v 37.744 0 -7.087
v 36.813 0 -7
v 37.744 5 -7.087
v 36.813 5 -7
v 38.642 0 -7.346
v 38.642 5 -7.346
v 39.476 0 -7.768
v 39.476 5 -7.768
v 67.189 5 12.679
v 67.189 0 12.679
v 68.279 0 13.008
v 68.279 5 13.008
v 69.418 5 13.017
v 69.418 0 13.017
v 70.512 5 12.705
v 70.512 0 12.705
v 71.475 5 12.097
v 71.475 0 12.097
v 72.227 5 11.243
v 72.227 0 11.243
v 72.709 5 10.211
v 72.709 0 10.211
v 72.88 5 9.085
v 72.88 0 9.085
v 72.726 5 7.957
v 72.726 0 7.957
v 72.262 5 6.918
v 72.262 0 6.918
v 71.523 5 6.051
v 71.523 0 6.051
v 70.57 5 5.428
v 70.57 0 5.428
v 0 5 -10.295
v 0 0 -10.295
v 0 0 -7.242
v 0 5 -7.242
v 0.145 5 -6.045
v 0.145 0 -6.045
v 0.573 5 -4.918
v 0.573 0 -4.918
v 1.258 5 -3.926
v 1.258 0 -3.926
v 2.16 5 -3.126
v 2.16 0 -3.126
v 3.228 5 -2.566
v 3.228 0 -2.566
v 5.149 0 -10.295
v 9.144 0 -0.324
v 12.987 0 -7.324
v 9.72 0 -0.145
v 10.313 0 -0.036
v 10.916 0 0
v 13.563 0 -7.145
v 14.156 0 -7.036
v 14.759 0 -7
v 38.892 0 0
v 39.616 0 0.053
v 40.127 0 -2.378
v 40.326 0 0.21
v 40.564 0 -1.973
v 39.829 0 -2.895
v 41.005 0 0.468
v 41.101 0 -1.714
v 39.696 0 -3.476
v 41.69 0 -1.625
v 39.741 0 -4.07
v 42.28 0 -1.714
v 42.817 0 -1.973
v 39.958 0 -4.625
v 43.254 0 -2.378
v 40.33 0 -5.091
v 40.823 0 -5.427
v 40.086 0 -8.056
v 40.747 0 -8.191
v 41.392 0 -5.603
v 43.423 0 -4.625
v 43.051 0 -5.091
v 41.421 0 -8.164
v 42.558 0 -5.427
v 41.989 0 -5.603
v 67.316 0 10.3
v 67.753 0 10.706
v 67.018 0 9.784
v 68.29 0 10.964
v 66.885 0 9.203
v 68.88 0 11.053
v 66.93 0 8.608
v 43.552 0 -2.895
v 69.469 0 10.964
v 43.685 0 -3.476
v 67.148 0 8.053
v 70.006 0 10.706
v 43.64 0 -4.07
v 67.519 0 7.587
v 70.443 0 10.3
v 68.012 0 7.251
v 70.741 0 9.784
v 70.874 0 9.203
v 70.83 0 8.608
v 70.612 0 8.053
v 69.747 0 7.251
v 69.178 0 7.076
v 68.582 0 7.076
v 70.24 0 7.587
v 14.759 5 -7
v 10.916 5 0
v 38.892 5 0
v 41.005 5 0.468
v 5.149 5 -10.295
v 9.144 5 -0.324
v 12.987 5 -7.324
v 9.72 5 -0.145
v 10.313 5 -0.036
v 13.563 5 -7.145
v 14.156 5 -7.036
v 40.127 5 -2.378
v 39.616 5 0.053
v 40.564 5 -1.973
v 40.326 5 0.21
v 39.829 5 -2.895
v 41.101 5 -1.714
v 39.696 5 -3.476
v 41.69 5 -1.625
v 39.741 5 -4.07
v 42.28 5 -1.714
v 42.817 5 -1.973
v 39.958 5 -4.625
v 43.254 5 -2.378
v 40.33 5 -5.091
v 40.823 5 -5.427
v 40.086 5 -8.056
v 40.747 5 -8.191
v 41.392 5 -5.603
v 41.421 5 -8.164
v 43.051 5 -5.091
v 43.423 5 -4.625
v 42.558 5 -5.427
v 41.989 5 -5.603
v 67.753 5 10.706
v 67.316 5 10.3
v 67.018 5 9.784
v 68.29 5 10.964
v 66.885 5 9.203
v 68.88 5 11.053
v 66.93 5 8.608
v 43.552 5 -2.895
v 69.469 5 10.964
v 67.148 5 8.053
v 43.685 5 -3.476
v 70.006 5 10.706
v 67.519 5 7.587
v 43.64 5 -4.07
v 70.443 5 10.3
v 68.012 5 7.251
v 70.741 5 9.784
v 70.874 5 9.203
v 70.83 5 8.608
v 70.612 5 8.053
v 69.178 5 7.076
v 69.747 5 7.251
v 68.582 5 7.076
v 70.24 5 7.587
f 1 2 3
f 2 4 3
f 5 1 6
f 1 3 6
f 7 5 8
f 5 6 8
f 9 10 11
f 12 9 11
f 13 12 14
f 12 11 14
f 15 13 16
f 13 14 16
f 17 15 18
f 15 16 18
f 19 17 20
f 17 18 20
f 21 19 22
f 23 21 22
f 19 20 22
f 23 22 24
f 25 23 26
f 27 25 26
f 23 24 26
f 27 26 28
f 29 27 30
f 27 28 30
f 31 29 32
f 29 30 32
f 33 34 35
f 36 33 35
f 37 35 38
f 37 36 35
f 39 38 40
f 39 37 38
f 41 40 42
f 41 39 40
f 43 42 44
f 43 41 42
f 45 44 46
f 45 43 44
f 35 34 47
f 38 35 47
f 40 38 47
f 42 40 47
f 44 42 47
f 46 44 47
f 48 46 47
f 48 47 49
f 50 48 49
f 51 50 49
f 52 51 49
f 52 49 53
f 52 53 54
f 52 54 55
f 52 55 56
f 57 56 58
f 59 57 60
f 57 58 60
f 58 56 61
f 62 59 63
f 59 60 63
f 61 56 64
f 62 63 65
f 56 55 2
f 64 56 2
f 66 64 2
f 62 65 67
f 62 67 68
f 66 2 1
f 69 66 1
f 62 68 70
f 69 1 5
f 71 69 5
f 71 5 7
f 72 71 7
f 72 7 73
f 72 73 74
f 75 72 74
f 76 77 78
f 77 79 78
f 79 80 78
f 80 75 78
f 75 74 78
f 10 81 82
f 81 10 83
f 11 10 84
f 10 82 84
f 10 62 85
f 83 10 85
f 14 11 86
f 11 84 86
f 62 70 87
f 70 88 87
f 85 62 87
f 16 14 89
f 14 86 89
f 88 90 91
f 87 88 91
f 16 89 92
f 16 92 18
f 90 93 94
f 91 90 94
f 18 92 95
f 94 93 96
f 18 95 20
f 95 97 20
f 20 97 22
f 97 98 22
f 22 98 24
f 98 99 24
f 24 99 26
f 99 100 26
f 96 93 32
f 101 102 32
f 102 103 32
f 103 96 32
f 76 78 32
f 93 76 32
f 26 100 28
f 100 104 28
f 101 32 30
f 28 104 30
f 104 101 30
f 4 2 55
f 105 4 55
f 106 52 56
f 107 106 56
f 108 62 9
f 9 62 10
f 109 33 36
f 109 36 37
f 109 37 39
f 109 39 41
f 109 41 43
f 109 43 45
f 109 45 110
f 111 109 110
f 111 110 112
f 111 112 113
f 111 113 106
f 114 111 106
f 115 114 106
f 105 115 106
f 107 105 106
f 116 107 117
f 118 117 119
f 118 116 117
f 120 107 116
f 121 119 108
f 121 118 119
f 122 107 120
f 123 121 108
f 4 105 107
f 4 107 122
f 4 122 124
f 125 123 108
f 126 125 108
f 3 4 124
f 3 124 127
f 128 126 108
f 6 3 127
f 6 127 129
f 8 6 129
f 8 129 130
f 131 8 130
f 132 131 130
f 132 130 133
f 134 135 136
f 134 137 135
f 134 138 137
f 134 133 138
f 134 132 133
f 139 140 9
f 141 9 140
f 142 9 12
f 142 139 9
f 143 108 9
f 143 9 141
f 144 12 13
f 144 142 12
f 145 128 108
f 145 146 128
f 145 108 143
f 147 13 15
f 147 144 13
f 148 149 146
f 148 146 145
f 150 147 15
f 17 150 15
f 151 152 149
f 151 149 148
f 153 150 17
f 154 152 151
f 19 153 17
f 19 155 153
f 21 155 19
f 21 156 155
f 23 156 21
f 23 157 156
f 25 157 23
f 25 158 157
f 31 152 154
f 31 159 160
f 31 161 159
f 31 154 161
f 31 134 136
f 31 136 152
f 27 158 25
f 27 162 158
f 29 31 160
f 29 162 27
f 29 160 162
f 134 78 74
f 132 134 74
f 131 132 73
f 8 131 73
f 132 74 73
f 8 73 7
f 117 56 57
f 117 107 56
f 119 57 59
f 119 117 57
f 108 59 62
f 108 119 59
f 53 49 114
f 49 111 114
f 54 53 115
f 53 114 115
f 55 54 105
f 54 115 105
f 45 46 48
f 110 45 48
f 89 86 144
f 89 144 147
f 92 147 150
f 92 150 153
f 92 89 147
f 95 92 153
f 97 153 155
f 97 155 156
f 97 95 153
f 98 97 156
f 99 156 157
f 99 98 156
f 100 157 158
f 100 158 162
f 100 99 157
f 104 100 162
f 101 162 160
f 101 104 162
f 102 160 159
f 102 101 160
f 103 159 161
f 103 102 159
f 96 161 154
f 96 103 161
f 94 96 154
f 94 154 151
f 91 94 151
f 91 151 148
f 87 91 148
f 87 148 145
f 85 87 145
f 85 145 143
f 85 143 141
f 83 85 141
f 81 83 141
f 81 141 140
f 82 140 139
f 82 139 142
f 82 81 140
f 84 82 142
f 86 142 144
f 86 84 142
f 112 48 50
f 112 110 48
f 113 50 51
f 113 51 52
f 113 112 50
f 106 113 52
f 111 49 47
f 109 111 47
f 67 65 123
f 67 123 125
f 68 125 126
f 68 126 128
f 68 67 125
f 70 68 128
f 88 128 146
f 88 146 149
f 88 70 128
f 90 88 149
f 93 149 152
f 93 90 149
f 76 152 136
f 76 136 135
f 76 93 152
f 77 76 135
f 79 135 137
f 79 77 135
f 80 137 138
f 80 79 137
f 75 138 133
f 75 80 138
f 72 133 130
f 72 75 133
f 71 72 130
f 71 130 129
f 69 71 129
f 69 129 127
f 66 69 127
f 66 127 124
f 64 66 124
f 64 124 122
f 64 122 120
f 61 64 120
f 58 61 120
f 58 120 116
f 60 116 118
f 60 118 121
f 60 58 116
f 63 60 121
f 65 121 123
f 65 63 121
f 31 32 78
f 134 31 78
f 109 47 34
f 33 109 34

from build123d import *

# Parameters (mm, degrees)
ESQUISSE1_R        = 2
BOSS_EXTRU_1_DEPTH = 5
CONG_1_R           = 5


with BuildPart() as part:
    # Esquisse1 → Boss.-Extru.1 (new body)
    with BuildSketch(Plane(origin=(0, 0, 0), x_dir=(1, 0, 0), z_dir=(0, 1, 0))):
        with BuildLine():
            Line((0, 10.29493472), (0, 3.789721085))
            Line((0, 3.789721085), (10, 0))
            Line((10, 0), (40, 0))
            Line((40, 0), (67.189233611, -12.678547852))
            ThreePointArc((67.189233611, -12.678547852), (72.504937806, -10.743789751), (70.570179705, -5.428085556))
            Line((70.570179705, -5.428085556), (41.421148718, 8.164330821))
            ThreePointArc((41.421148718, 8.164330821), (39.877944642, 7.977690672), (38.669460337, 7))
            Line((38.669460337, 7), (13.843067102, 7))
            Line((13.843067102, 7), (5.148668105, 10.29493472))
            Line((5.148668105, 10.29493472), (0, 10.29493472))
        make_face()
        with Locations(Location((68.879706658, -9.053316704, 0), (0, 0, 270))):
            Circle(ESQUISSE1_R, mode=Mode.SUBTRACT)
        with Locations(Location((41.690473047, 3.625231148, 0), (0, 0, 270))):
            Circle(ESQUISSE1_R, mode=Mode.SUBTRACT)
    extrude(amount=BOSS_EXTRU_1_DEPTH)

    # Congé1
    cong_1_edges = [part.edges().sort_by_distance(p)[0] for p in [
        (13.843067102, 2.5, -7),
        (38.669460337, 2.5, -7),
        (40, 2.5, 0),
        (10, 2.5, 0),
        (0, 2.5, -3.789721085),
    ]]
    fillet(cong_1_edges, radius=CONG_1_R)


solid = part.part
